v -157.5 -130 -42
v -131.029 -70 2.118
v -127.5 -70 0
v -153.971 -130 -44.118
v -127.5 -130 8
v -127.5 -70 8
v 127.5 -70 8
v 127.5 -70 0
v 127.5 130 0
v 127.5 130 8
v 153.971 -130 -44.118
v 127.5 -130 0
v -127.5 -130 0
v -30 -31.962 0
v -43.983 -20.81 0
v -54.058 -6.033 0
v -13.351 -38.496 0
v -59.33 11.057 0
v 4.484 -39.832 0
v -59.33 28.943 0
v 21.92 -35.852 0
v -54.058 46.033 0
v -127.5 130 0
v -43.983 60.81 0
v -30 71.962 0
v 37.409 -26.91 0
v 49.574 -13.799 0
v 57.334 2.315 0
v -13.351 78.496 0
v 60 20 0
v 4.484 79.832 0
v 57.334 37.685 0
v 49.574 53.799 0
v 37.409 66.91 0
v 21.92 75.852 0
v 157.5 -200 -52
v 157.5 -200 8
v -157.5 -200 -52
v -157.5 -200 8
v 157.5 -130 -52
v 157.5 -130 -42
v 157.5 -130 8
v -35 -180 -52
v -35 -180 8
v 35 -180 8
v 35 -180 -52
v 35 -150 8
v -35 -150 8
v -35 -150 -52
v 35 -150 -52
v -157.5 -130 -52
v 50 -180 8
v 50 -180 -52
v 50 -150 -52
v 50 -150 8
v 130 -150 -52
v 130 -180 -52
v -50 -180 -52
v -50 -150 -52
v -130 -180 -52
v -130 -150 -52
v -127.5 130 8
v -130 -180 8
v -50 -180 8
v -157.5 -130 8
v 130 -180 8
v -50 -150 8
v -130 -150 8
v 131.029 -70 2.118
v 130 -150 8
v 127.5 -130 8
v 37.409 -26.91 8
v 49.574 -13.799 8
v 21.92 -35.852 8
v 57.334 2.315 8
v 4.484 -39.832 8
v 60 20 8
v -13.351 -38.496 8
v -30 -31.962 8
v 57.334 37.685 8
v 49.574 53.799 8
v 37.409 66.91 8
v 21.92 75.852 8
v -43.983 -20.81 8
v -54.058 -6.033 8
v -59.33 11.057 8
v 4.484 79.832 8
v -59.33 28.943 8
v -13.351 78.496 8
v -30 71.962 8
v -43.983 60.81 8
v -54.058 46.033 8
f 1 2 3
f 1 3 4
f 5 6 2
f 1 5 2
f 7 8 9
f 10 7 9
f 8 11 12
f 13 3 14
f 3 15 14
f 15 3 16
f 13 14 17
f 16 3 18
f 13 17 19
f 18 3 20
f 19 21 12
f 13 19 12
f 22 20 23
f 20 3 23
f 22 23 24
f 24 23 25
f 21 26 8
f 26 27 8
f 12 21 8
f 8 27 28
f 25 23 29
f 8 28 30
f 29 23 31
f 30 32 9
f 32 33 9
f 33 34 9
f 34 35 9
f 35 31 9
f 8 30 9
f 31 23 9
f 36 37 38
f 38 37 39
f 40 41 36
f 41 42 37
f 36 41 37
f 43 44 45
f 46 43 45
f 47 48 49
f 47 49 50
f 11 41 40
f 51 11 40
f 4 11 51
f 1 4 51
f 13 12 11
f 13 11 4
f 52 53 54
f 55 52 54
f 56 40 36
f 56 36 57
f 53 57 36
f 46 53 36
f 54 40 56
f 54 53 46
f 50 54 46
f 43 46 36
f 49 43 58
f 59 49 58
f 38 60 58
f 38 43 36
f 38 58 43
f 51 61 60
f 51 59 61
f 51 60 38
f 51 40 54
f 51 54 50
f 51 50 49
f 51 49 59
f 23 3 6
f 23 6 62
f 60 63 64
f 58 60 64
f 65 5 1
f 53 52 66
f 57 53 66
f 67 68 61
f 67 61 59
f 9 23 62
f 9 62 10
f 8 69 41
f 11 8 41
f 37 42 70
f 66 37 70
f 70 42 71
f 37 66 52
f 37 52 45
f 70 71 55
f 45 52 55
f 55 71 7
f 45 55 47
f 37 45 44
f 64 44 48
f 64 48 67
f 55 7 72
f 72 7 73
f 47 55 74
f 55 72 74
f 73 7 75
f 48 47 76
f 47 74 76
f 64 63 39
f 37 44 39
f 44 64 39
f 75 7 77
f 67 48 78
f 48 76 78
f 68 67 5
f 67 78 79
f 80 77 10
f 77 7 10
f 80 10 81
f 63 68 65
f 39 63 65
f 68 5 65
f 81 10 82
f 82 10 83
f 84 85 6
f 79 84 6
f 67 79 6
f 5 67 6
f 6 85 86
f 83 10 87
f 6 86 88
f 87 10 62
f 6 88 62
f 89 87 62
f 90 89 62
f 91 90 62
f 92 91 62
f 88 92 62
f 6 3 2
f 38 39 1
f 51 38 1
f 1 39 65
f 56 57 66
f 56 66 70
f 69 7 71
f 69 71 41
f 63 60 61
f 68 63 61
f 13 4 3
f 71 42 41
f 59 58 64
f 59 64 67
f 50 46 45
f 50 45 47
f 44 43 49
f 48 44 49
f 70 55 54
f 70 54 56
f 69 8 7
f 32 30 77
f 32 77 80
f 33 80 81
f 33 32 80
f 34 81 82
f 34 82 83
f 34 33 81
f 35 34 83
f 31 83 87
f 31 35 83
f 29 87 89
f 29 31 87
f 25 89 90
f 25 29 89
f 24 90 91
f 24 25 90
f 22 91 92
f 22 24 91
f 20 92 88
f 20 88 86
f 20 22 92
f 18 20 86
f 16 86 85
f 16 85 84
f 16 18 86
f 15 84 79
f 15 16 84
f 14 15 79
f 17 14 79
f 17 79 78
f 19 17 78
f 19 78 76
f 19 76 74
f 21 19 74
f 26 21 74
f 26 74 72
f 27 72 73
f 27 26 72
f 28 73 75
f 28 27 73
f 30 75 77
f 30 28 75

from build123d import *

# Parameters (mm, degrees)
SKETCH1_W           = 255
SKETCH1_H           = 260
SKETCH1_R           = 60
BOSS_EXTRUDE1_DEPTH = 8
SKETCH2_W           = 70
SKETCH2_H           = 30
SKETCH2_W_2         = 80
BOSS_EXTRUDE2_DEPTH = 60
BOSS_EXTRUDE3_DEPTH = 60
CUT_EXTRUDE1_DEPTH  = 60
CUT_EXTRUDE2_DEPTH  = 60


with BuildPart() as part:
    # Sketch1 → Boss-Extrude1 (new body)
    with BuildSketch(Plane.XY):
        Rectangle(SKETCH1_W, SKETCH1_H)
        with Locations((0, 20)):
            Circle(SKETCH1_R, mode=Mode.SUBTRACT)
    extrude(amount=BOSS_EXTRUDE1_DEPTH)

    # Sketch2 → Boss-Extrude2 (add)
    with BuildSketch(Plane.XY.offset(8)):
        Polygon((0, -130), (157.5, -130), (157.5, -200), (-157.5, -200), (-157.5, -130), align=None)
        with Locations((0, -165)):
            Rectangle(SKETCH2_W, SKETCH2_H, mode=Mode.SUBTRACT)
        with Locations((90, -165)):
            Rectangle(SKETCH2_W_2, SKETCH2_H, mode=Mode.SUBTRACT)
        with Locations((-90, -165)):
            Rectangle(SKETCH2_W_2, SKETCH2_H, mode=Mode.SUBTRACT)
    extrude(amount=-BOSS_EXTRUDE2_DEPTH)

    # Sketch3 → Boss-Extrude3 (add)
    with BuildSketch(Plane(origin=(0, -130, 0), x_dir=(1, 0, 0), z_dir=(0, 1, 0))):
        Polygon((127.5, -8), (157.5, 42), (153.970588235, 44.117647059), (127.5, 0), align=None)
    boss_extrude3 = extrude(amount=BOSS_EXTRUDE3_DEPTH)

    # Sketch4 → Cut-Extrude1 (cut)
    with BuildSketch(Plane(origin=(97.279411765, 0, 58.367647059), x_dir=(0.5144957554275268, 0, -0.8574929257125441), z_dir=(0.8574929257125441, 0, 0.5144957554275268))):
        Polygon((65.598208817, -70), (117.04778436, -130), (117.04778436, -70), align=None)
    extrude(amount=-CUT_EXTRUDE1_DEPTH, mode=Mode.SUBTRACT)

    # Mirror4: Boss-Extrude3 across plane
    add(boss_extrude3.mirror(Plane(origin=(0, 0, 0), x_dir=(0, 0, 1), z_dir=(1, 0, 0))))

    # Sketch5 → Cut-Extrude2 (cut)
    with BuildSketch(Plane(origin=(-97.279411765, 0, 58.367647059), x_dir=(0.514495755427527, 0, 0.857492925712544), z_dir=(-0.857492925712544, 0, 0.514495755427527))):
        Polygon((-65.598208817, -70), (-117.04778436, -130), (-117.04778436, -70), align=None)
    extrude(amount=-CUT_EXTRUDE2_DEPTH, mode=Mode.SUBTRACT)


solid = part.part
